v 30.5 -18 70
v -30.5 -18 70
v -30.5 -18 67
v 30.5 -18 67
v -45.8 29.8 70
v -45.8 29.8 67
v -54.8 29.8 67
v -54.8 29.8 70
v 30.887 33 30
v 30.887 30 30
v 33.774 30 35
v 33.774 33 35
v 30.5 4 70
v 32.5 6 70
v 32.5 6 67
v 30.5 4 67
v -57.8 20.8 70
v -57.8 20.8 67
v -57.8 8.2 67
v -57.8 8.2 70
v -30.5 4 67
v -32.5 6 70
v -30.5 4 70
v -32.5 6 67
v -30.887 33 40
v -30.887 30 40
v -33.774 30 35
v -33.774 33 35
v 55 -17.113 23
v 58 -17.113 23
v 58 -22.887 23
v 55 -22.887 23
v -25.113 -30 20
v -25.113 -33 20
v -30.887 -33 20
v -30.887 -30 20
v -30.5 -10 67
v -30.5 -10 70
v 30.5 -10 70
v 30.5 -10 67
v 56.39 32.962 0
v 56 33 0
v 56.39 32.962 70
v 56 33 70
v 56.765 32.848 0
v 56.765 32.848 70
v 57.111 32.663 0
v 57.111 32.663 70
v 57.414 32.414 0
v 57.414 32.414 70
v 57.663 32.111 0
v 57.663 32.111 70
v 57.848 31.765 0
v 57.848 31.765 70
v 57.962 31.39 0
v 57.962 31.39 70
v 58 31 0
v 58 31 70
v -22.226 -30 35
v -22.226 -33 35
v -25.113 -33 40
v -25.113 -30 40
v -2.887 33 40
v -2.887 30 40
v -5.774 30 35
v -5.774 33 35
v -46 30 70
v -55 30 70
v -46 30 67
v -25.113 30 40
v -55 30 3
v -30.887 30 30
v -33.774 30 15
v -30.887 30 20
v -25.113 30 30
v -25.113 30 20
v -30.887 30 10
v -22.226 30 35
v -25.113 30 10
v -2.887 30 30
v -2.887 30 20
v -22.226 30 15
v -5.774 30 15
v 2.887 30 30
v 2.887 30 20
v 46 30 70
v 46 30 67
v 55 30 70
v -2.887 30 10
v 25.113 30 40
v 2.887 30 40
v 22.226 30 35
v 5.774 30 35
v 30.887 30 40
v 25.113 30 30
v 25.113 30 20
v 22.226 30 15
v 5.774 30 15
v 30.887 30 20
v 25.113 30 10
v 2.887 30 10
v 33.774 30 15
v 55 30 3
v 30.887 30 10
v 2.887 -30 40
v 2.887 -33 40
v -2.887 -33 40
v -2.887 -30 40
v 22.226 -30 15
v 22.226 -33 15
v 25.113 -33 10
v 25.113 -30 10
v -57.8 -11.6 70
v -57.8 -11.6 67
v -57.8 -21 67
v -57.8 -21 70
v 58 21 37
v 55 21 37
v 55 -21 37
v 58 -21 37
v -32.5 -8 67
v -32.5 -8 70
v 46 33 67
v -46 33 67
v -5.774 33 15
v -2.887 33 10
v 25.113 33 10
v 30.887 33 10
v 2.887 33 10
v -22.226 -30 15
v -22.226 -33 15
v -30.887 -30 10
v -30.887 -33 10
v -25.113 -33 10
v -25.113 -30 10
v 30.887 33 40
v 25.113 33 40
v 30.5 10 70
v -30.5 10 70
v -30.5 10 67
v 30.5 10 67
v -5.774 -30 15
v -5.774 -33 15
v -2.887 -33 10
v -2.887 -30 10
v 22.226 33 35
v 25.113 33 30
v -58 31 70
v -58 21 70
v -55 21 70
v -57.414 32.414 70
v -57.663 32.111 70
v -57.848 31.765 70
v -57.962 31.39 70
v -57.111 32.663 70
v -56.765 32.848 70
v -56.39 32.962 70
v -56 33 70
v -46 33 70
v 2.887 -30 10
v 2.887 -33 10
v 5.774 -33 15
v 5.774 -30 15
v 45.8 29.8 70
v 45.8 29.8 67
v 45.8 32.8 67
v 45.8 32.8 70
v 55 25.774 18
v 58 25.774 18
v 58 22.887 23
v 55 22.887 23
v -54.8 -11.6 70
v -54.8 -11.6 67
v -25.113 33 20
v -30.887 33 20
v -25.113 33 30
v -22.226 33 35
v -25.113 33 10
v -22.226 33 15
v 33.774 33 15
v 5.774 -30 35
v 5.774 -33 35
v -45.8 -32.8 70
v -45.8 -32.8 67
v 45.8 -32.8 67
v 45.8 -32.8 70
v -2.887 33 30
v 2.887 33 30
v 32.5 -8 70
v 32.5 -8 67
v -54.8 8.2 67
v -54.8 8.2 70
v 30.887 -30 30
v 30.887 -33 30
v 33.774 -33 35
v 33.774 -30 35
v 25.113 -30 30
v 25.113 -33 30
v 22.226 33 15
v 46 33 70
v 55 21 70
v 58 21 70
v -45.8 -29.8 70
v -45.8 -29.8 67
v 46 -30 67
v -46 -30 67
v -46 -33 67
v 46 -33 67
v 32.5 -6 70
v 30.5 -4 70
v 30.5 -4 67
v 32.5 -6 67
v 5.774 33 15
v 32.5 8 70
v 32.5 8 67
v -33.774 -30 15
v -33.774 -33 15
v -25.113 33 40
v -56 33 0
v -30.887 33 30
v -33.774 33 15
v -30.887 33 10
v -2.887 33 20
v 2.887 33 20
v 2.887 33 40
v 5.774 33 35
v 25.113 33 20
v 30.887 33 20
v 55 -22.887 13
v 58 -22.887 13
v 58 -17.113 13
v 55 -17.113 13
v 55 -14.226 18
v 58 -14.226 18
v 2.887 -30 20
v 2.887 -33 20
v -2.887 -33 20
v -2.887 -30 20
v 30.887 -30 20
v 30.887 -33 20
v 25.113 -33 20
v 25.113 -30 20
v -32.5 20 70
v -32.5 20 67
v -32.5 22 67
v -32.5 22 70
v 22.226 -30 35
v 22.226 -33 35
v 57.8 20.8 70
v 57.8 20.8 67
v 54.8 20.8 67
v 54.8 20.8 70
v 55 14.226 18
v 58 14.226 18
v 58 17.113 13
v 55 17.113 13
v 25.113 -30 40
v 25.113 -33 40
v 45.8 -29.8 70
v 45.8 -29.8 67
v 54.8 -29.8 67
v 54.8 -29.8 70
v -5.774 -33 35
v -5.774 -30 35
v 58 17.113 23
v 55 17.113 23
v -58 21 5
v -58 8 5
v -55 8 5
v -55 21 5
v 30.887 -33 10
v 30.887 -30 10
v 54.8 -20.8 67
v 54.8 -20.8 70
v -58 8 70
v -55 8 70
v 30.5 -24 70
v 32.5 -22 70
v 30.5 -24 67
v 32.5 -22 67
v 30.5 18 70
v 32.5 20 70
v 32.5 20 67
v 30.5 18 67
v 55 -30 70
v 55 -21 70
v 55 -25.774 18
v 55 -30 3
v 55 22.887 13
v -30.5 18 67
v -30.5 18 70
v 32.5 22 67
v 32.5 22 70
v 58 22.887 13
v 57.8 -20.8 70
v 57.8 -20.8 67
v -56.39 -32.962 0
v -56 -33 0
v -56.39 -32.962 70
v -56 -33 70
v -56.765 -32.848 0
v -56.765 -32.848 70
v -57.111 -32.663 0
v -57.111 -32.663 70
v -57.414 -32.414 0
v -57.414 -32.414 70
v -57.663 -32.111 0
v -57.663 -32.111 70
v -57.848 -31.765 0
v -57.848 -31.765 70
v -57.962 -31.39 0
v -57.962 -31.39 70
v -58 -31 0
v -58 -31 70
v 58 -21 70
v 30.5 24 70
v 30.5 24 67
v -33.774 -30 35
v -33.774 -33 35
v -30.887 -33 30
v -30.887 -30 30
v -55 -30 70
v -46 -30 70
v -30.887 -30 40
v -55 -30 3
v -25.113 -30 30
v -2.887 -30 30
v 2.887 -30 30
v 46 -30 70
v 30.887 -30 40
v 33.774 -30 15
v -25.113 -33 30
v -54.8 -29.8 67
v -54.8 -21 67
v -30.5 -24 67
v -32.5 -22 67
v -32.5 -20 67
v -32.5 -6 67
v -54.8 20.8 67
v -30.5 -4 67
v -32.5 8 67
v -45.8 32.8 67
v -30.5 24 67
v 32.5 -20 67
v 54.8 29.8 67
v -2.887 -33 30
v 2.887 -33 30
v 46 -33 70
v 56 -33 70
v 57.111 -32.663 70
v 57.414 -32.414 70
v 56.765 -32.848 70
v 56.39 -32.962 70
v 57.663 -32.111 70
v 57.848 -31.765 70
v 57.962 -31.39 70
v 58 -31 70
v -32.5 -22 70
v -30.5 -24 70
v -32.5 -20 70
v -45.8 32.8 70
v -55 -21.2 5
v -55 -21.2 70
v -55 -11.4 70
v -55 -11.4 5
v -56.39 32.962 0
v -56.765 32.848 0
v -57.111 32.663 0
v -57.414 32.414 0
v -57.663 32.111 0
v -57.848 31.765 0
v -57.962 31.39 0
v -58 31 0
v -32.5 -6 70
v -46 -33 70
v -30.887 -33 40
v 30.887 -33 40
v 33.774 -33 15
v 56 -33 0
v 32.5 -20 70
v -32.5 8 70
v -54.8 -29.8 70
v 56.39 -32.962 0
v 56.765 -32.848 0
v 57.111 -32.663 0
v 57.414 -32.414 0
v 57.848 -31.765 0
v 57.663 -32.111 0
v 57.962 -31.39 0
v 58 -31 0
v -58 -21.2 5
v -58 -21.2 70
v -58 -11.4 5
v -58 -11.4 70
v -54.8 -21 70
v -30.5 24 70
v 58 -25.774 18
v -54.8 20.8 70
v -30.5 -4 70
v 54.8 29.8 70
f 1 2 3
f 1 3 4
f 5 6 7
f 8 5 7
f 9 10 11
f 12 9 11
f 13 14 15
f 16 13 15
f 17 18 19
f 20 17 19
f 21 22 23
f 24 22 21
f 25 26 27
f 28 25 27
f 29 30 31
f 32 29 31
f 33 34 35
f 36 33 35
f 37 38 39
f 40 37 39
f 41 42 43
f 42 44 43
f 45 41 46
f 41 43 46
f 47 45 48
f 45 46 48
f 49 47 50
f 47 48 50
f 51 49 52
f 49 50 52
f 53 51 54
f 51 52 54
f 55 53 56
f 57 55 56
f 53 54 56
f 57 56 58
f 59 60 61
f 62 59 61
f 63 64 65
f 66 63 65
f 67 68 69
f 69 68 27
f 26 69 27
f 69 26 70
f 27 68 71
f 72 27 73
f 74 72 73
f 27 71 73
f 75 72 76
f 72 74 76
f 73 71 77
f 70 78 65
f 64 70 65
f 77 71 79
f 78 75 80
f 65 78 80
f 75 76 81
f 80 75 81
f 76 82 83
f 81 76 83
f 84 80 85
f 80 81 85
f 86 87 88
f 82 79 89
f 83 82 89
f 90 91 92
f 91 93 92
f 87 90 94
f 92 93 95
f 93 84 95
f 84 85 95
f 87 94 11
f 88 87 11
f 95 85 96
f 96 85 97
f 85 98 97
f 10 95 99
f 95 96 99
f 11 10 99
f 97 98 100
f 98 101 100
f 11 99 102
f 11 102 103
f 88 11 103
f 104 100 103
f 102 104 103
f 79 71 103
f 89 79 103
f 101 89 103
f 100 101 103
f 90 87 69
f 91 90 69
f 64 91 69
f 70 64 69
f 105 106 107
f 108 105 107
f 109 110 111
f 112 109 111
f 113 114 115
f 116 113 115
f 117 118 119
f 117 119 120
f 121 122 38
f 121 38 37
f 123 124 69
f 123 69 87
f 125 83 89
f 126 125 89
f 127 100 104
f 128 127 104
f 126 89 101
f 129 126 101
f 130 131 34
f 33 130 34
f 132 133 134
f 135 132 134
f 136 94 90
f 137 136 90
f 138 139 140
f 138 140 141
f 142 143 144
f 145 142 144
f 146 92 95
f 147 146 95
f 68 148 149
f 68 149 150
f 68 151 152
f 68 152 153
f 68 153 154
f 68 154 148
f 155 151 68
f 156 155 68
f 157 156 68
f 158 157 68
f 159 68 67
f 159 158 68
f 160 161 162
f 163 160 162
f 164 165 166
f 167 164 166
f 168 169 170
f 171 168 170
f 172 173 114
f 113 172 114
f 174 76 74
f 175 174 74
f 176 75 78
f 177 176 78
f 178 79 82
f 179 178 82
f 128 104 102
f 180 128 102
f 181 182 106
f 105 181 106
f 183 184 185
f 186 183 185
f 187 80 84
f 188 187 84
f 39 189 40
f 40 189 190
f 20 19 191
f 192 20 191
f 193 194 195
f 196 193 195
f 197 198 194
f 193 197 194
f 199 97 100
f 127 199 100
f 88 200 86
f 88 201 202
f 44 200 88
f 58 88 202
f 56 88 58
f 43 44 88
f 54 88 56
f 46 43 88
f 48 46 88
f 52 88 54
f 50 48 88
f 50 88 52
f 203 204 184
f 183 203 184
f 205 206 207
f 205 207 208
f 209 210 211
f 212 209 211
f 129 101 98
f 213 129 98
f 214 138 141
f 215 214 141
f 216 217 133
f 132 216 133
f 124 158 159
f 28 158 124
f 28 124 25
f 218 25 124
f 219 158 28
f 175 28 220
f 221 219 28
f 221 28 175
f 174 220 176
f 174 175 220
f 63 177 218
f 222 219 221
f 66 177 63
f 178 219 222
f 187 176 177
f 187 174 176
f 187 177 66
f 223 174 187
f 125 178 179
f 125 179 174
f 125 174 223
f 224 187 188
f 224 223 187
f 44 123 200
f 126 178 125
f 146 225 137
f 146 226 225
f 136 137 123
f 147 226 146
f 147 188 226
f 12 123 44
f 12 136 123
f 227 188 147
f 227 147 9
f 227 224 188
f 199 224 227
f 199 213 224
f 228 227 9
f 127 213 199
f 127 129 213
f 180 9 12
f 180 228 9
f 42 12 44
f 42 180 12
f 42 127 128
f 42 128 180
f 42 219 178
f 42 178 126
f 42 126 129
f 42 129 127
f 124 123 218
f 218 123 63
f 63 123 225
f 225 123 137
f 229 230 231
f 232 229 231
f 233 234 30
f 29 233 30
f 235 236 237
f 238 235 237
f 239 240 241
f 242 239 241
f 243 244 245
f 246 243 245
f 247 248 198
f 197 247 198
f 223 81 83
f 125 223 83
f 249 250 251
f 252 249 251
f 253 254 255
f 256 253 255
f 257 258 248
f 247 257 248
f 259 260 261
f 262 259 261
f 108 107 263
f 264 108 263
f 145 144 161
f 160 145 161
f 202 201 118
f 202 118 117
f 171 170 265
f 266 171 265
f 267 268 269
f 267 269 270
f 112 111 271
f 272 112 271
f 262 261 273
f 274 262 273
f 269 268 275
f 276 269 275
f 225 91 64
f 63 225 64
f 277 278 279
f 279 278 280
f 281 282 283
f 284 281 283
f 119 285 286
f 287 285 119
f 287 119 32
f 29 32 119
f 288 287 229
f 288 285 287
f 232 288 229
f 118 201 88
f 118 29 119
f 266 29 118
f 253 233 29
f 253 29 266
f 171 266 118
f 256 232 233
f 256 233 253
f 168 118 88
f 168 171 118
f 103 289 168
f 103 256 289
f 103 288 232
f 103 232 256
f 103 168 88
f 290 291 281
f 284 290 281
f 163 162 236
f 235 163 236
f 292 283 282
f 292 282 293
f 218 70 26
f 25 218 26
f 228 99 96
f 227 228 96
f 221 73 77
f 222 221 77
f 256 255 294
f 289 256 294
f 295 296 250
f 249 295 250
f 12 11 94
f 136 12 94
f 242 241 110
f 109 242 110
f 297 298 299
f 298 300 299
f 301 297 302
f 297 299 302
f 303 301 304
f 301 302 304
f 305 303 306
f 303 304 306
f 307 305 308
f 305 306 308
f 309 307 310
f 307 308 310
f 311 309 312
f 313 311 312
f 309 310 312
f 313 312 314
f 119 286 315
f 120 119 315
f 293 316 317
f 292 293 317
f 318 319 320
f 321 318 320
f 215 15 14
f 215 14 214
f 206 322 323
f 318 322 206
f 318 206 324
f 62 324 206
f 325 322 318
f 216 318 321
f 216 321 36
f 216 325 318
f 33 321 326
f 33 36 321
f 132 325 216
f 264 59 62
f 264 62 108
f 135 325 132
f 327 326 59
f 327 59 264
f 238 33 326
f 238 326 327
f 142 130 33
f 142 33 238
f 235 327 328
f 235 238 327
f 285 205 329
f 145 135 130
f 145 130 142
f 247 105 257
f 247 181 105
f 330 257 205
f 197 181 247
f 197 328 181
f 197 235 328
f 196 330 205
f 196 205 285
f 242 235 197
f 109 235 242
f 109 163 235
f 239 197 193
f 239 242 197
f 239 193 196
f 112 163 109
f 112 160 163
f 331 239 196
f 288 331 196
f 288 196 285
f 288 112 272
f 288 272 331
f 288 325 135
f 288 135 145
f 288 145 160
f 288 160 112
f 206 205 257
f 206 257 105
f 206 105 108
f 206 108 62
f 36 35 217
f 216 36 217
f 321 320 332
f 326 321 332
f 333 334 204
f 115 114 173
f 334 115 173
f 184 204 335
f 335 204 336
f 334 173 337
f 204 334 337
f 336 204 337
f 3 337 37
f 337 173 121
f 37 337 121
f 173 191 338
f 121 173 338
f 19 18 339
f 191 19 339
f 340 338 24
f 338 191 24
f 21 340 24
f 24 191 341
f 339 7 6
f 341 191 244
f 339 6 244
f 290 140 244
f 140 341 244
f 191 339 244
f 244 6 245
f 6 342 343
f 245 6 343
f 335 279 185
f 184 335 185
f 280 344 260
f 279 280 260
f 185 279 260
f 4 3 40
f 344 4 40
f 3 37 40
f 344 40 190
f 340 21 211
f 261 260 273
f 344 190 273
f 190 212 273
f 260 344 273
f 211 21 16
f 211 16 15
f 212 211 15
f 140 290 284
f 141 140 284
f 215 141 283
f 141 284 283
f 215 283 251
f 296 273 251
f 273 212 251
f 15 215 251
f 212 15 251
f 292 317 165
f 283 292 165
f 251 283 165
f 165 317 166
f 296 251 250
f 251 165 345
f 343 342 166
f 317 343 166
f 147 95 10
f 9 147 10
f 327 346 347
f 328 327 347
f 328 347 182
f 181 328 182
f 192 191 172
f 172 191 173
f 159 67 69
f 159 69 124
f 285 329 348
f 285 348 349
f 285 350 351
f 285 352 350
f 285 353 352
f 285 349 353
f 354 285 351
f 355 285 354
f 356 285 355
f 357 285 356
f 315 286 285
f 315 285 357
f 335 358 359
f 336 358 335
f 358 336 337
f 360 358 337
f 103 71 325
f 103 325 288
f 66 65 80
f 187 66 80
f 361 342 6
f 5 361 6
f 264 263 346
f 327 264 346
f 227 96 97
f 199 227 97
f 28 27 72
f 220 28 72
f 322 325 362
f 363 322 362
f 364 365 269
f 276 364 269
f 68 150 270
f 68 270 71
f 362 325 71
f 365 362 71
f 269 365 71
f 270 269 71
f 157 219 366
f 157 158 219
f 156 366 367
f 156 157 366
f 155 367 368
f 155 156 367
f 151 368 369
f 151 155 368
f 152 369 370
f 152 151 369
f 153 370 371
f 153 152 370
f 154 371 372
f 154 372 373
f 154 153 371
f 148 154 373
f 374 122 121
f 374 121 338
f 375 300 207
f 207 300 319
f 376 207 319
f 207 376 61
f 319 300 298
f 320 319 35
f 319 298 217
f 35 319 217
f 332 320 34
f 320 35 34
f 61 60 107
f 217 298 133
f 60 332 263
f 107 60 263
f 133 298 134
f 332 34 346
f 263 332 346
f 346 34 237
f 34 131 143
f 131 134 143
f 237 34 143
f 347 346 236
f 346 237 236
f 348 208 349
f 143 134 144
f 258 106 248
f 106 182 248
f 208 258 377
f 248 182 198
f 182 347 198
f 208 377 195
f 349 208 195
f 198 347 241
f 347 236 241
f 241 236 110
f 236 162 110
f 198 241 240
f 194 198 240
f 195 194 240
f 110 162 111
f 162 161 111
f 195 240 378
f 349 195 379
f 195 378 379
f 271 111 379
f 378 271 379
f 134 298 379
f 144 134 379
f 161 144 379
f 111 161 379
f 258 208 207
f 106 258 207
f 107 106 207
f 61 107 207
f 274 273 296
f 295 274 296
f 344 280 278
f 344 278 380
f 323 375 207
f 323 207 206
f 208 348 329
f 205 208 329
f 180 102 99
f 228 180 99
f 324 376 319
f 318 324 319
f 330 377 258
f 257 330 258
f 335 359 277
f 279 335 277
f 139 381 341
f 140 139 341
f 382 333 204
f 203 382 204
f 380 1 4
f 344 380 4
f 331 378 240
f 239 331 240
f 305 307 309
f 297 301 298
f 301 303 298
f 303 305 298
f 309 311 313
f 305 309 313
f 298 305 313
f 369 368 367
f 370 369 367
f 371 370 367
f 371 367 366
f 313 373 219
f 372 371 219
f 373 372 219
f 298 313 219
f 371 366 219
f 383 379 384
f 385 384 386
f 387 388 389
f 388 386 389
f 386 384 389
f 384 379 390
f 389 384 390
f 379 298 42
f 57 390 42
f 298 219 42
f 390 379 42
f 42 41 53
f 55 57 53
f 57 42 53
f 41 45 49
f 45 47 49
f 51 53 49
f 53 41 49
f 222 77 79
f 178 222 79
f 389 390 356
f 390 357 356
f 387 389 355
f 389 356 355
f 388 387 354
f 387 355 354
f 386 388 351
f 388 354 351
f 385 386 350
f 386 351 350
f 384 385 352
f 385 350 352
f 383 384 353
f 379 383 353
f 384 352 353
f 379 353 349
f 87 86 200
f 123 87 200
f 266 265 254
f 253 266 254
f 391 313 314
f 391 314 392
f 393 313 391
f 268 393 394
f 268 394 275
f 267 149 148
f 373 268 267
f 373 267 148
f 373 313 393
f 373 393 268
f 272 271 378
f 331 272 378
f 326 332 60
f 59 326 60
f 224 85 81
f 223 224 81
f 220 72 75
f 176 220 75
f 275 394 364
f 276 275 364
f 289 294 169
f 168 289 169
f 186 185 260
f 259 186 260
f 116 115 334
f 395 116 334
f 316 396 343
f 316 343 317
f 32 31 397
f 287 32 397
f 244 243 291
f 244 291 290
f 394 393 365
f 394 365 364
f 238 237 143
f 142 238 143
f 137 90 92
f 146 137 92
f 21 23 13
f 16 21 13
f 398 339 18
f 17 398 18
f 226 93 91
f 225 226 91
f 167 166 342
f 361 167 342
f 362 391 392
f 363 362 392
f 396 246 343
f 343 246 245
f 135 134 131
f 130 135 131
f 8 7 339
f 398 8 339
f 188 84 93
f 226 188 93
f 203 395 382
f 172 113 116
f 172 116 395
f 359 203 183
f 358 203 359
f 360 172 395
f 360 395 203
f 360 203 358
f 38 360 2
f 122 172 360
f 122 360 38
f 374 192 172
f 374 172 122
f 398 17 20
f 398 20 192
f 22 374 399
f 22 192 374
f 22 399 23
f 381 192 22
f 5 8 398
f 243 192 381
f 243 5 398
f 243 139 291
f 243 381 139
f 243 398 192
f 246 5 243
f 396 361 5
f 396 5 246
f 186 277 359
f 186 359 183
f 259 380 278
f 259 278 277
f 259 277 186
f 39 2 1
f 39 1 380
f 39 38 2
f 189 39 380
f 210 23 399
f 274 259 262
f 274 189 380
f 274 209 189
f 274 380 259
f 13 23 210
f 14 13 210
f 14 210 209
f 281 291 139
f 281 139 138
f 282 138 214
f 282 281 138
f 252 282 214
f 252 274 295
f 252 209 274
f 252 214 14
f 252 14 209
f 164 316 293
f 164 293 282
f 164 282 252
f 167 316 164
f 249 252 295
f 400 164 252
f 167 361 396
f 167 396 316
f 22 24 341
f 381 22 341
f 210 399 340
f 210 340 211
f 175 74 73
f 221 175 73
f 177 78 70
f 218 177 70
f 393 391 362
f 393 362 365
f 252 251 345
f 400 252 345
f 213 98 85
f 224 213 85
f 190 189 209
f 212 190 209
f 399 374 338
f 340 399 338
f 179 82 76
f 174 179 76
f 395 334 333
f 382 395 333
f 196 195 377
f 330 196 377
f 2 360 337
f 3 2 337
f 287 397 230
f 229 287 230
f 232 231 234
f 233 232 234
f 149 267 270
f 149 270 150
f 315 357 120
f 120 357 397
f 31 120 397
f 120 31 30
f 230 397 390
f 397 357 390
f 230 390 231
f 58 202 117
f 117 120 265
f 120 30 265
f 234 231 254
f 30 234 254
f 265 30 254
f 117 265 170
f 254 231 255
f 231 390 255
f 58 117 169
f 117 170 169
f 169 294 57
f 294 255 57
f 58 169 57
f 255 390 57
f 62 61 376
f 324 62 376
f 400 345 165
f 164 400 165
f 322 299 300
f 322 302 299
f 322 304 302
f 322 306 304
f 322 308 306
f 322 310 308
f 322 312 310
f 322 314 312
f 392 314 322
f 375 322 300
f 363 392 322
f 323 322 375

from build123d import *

# Parameters (mm, degrees)
SKETCH1_W           = 116
SKETCH1_H           = 66
SKETCH1_W_2         = 110
SKETCH1_H_2         = 60
BOSS_EXTRUDE1_DEPTH = 70
SKETCH1_2_W         = 110
SKETCH1_2_H         = 60
BOSS_EXTRUDE2_DEPTH = 3
CUT_EXTRUDE1_REACH  = 118
SKETCH2_W           = 65
SKETCH2_H           = 9.8
SKETCH2_H_2         = 13
CUT_EXTRUDE2_DEPTH  = 67
CUT_EXTRUDE3_REACH  = 118
SKETCH5_W           = 92
SKETCH5_H           = 3
SKETCH5_W_2         = 3
SKETCH5_H_2         = 42
CUT_EXTRUDE4_DEPTH  = 3
SKETCH6_W           = 2.8
SKETCH6_H           = 41.6
BOSS_EXTRUDE3_DEPTH = 3
SKETCH7_W           = 65
SKETCH7_H           = 6
CUT_EXTRUDE5_DEPTH  = 3
SKETCH8_W           = 3
SKETCH8_H           = 42
CUT_EXTRUDE6_DEPTH  = 30
CHAMFER1_SIZE       = 2
FILLET1_R           = 2


with BuildPart() as part:
    # Sketch1 → Boss-Extrude1 (new body)
    with BuildSketch(Plane.XY):
        Rectangle(SKETCH1_W, SKETCH1_H)
        Rectangle(SKETCH1_W_2, SKETCH1_H_2, mode=Mode.SUBTRACT)
    extrude(amount=BOSS_EXTRUDE1_DEPTH)

    # Sketch1<2> → Boss-Extrude2 (add)
    with BuildSketch(Plane.XY):
        Rectangle(SKETCH1_2_W, SKETCH1_2_H)
    extrude(amount=BOSS_EXTRUDE2_DEPTH)

    # Sketch2 → Cut-Extrude1 (cut, up to next)
    with BuildSketch(Plane.ZY.offset(58), mode=Mode.PRIVATE) as cut_extrude1_sk1:
        with Locations((37.5, -16.3)):
            Rectangle(SKETCH2_W, SKETCH2_H)
    cut_extrude1_tool1 = extrude(cut_extrude1_sk1.sketch, amount=-CUT_EXTRUDE1_REACH, mode=Mode.PRIVATE) & part.part
    add(cut_extrude1_tool1.solids().sort_by_distance((-58, -16.3, 37.5))[0], mode=Mode.SUBTRACT)
    # Sketch2 → Cut-Extrude1 (cut, up to next)
    with BuildSketch(Plane.ZY.offset(58), mode=Mode.PRIVATE) as cut_extrude1_sk2:
        with Locations((37.5, 14.5)):
            Rectangle(SKETCH2_W, SKETCH2_H_2)
    cut_extrude1_tool2 = extrude(cut_extrude1_sk2.sketch, amount=-CUT_EXTRUDE1_REACH, mode=Mode.PRIVATE) & part.part
    add(cut_extrude1_tool2.solids().sort_by_distance((-58, 14.5, 37.5))[0], mode=Mode.SUBTRACT)

    # Sketch3 → Cut-Extrude2 (cut, through all)
    with BuildSketch(Plane.XZ.offset(33)):
        Polygon((-25.113248654, 40), (-30.886751346, 40), (-33.773502692, 35), (-30.886751346, 30), (-25.113248654, 30), (-22.226497308, 35), align=None)
        Polygon((2.886751346, 40), (-2.886751346, 40), (-5.773502692, 35), (-2.886751346, 30), (2.886751346, 30), (5.773502692, 35), align=None)
        Polygon((30.886751346, 40), (25.113248654, 40), (22.226497308, 35), (25.113248654, 30), (30.886751346, 30), (33.773502692, 35), align=None)
        Polygon((30.886751346, 20), (25.113248654, 20), (22.226497308, 15), (25.113248654, 10), (30.886751346, 10), (33.773502692, 15), align=None)
        Polygon((2.886751346, 20), (-2.886751346, 20), (-5.773502692, 15), (-2.886751346, 10), (2.886751346, 10), (5.773502692, 15), align=None)
        Polygon((-25.113248654, 20), (-30.886751346, 20), (-33.773502692, 15), (-30.886751346, 10), (-25.113248654, 10), (-22.226497308, 15), align=None)
    extrude(amount=-CUT_EXTRUDE2_DEPTH, mode=Mode.SUBTRACT)

    # Sketch4 → Cut-Extrude3 (cut, up to next)
    with BuildSketch(Plane(origin=(58, 0, 0), x_dir=(0, 0, -1), z_dir=(1, 0, 0)), mode=Mode.PRIVATE) as cut_extrude3_sk1:
        Polygon((-18, 25.773502692), (-23, 22.886751346), (-23, 17.113248654), (-18, 14.226497308), (-13, 17.113248654), (-13, 22.886751346), align=None)
    cut_extrude3_tool1 = extrude(cut_extrude3_sk1.sketch, amount=-CUT_EXTRUDE3_REACH, mode=Mode.PRIVATE) & part.part
    add(cut_extrude3_tool1.solids().sort_by_distance((58, 20, 18))[0], mode=Mode.SUBTRACT)
    # Sketch4 → Cut-Extrude3 (cut, up to next)
    with BuildSketch(Plane(origin=(58, 0, 0), x_dir=(0, 0, -1), z_dir=(1, 0, 0)), mode=Mode.PRIVATE) as cut_extrude3_sk2:
        Polygon((-18, -14.226497308), (-23, -17.113248654), (-23, -22.886751346), (-18, -25.773502692), (-13, -22.886751346), (-13, -17.113248654), align=None)
    cut_extrude3_tool2 = extrude(cut_extrude3_sk2.sketch, amount=-CUT_EXTRUDE3_REACH, mode=Mode.PRIVATE) & part.part
    add(cut_extrude3_tool2.solids().sort_by_distance((58, -20, 18))[0], mode=Mode.SUBTRACT)

    # Sketch5 → Cut-Extrude4 (cut)
    with BuildSketch(Plane.XY.offset(70)):
        with Locations((0, 31.5)):
            Rectangle(SKETCH5_W, SKETCH5_H)
        with Locations((0, -31.5)):
            Rectangle(SKETCH5_W, SKETCH5_H)
        with Locations((56.5, 0)):
            Rectangle(SKETCH5_W_2, SKETCH5_H_2)
    extrude(amount=-CUT_EXTRUDE4_DEPTH, mode=Mode.SUBTRACT)

    # Sketch8 → Cut-Extrude6 (cut)
    with BuildSketch(Plane.XY.offset(67)):
        with Locations((56.5, 0)):
            Rectangle(SKETCH8_W, SKETCH8_H)
    extrude(amount=-CUT_EXTRUDE6_DEPTH, mode=Mode.SUBTRACT)

    # Fillet1
    fillet1_edges = [part.edges().sort_by_distance(p)[0] for p in [
        (-58, -33, 35),
        (-58, 33, 35),
        (58, 33, 35),
        (58, -33, 35),
    ]]
    fillet(fillet1_edges, radius=FILLET1_R)


with BuildPart() as body_2:
    # Sketch6 → Boss-Extrude3 (new body)
    with BuildSketch(Plane.XY.offset(67)):
        Polygon((55, -20.8), (55, 20.8), (54.8, 20.8), (54.8, 29.8), (45.8, 29.8), (45.8, 32.8), (-45.8, 32.8), (-45.8, 29.8), (-54.8, 29.8), (-54.8, 20.8), (-57.8, 20.8), (-57.8, 8.2), (-54.8, 8.2), (-54.8, -11.6), (-57.8, -11.6), (-57.8, -21), (-54.8, -21), (-54.8, -29.8), (-45.8, -29.8), (-45.8, -32.8), (45.8, -32.8), (45.8, -29.8), (54.8, -29.8), (54.8, -20.8), align=None)
        with Locations((56.4, 0)):
            Rectangle(SKETCH6_W, SKETCH6_H)
    extrude(amount=BOSS_EXTRUDE3_DEPTH)

    # Sketch7 → Cut-Extrude5 (cut)
    with BuildSketch(Plane.XY.offset(70)):
        with Locations((0, 21)):
            Rectangle(SKETCH7_W, SKETCH7_H)
        with Locations((0, 7)):
            Rectangle(SKETCH7_W, SKETCH7_H)
        with Locations((0, -7)):
            Rectangle(SKETCH7_W, SKETCH7_H)
        with Locations((0, -21)):
            Rectangle(SKETCH7_W, SKETCH7_H)
    extrude(amount=-CUT_EXTRUDE5_DEPTH, mode=Mode.SUBTRACT)

    # Chamfer1
    chamfer1_edges = [body_2.edges().sort_by_distance(p)[0] for p in [
        (-32.5, -10, 68.5),
        (-32.5, -4, 68.5),
        (32.5, -4, 68.5),
        (32.5, -10, 68.5),
        (-32.5, -24, 68.5),
        (-32.5, -18, 68.5),
        (32.5, -18, 68.5),
        (32.5, -24, 68.5),
        (-32.5, 18, 68.5),
        (-32.5, 24, 68.5),
        (32.5, 24, 68.5),
        (32.5, 18, 68.5),
        (-32.5, 4, 68.5),
        (-32.5, 10, 68.5),
        (32.5, 10, 68.5),
        (32.5, 4, 68.5),
    ]]
    chamfer(chamfer1_edges, length=CHAMFER1_SIZE)


solid = Compound([part.part, body_2.part])
